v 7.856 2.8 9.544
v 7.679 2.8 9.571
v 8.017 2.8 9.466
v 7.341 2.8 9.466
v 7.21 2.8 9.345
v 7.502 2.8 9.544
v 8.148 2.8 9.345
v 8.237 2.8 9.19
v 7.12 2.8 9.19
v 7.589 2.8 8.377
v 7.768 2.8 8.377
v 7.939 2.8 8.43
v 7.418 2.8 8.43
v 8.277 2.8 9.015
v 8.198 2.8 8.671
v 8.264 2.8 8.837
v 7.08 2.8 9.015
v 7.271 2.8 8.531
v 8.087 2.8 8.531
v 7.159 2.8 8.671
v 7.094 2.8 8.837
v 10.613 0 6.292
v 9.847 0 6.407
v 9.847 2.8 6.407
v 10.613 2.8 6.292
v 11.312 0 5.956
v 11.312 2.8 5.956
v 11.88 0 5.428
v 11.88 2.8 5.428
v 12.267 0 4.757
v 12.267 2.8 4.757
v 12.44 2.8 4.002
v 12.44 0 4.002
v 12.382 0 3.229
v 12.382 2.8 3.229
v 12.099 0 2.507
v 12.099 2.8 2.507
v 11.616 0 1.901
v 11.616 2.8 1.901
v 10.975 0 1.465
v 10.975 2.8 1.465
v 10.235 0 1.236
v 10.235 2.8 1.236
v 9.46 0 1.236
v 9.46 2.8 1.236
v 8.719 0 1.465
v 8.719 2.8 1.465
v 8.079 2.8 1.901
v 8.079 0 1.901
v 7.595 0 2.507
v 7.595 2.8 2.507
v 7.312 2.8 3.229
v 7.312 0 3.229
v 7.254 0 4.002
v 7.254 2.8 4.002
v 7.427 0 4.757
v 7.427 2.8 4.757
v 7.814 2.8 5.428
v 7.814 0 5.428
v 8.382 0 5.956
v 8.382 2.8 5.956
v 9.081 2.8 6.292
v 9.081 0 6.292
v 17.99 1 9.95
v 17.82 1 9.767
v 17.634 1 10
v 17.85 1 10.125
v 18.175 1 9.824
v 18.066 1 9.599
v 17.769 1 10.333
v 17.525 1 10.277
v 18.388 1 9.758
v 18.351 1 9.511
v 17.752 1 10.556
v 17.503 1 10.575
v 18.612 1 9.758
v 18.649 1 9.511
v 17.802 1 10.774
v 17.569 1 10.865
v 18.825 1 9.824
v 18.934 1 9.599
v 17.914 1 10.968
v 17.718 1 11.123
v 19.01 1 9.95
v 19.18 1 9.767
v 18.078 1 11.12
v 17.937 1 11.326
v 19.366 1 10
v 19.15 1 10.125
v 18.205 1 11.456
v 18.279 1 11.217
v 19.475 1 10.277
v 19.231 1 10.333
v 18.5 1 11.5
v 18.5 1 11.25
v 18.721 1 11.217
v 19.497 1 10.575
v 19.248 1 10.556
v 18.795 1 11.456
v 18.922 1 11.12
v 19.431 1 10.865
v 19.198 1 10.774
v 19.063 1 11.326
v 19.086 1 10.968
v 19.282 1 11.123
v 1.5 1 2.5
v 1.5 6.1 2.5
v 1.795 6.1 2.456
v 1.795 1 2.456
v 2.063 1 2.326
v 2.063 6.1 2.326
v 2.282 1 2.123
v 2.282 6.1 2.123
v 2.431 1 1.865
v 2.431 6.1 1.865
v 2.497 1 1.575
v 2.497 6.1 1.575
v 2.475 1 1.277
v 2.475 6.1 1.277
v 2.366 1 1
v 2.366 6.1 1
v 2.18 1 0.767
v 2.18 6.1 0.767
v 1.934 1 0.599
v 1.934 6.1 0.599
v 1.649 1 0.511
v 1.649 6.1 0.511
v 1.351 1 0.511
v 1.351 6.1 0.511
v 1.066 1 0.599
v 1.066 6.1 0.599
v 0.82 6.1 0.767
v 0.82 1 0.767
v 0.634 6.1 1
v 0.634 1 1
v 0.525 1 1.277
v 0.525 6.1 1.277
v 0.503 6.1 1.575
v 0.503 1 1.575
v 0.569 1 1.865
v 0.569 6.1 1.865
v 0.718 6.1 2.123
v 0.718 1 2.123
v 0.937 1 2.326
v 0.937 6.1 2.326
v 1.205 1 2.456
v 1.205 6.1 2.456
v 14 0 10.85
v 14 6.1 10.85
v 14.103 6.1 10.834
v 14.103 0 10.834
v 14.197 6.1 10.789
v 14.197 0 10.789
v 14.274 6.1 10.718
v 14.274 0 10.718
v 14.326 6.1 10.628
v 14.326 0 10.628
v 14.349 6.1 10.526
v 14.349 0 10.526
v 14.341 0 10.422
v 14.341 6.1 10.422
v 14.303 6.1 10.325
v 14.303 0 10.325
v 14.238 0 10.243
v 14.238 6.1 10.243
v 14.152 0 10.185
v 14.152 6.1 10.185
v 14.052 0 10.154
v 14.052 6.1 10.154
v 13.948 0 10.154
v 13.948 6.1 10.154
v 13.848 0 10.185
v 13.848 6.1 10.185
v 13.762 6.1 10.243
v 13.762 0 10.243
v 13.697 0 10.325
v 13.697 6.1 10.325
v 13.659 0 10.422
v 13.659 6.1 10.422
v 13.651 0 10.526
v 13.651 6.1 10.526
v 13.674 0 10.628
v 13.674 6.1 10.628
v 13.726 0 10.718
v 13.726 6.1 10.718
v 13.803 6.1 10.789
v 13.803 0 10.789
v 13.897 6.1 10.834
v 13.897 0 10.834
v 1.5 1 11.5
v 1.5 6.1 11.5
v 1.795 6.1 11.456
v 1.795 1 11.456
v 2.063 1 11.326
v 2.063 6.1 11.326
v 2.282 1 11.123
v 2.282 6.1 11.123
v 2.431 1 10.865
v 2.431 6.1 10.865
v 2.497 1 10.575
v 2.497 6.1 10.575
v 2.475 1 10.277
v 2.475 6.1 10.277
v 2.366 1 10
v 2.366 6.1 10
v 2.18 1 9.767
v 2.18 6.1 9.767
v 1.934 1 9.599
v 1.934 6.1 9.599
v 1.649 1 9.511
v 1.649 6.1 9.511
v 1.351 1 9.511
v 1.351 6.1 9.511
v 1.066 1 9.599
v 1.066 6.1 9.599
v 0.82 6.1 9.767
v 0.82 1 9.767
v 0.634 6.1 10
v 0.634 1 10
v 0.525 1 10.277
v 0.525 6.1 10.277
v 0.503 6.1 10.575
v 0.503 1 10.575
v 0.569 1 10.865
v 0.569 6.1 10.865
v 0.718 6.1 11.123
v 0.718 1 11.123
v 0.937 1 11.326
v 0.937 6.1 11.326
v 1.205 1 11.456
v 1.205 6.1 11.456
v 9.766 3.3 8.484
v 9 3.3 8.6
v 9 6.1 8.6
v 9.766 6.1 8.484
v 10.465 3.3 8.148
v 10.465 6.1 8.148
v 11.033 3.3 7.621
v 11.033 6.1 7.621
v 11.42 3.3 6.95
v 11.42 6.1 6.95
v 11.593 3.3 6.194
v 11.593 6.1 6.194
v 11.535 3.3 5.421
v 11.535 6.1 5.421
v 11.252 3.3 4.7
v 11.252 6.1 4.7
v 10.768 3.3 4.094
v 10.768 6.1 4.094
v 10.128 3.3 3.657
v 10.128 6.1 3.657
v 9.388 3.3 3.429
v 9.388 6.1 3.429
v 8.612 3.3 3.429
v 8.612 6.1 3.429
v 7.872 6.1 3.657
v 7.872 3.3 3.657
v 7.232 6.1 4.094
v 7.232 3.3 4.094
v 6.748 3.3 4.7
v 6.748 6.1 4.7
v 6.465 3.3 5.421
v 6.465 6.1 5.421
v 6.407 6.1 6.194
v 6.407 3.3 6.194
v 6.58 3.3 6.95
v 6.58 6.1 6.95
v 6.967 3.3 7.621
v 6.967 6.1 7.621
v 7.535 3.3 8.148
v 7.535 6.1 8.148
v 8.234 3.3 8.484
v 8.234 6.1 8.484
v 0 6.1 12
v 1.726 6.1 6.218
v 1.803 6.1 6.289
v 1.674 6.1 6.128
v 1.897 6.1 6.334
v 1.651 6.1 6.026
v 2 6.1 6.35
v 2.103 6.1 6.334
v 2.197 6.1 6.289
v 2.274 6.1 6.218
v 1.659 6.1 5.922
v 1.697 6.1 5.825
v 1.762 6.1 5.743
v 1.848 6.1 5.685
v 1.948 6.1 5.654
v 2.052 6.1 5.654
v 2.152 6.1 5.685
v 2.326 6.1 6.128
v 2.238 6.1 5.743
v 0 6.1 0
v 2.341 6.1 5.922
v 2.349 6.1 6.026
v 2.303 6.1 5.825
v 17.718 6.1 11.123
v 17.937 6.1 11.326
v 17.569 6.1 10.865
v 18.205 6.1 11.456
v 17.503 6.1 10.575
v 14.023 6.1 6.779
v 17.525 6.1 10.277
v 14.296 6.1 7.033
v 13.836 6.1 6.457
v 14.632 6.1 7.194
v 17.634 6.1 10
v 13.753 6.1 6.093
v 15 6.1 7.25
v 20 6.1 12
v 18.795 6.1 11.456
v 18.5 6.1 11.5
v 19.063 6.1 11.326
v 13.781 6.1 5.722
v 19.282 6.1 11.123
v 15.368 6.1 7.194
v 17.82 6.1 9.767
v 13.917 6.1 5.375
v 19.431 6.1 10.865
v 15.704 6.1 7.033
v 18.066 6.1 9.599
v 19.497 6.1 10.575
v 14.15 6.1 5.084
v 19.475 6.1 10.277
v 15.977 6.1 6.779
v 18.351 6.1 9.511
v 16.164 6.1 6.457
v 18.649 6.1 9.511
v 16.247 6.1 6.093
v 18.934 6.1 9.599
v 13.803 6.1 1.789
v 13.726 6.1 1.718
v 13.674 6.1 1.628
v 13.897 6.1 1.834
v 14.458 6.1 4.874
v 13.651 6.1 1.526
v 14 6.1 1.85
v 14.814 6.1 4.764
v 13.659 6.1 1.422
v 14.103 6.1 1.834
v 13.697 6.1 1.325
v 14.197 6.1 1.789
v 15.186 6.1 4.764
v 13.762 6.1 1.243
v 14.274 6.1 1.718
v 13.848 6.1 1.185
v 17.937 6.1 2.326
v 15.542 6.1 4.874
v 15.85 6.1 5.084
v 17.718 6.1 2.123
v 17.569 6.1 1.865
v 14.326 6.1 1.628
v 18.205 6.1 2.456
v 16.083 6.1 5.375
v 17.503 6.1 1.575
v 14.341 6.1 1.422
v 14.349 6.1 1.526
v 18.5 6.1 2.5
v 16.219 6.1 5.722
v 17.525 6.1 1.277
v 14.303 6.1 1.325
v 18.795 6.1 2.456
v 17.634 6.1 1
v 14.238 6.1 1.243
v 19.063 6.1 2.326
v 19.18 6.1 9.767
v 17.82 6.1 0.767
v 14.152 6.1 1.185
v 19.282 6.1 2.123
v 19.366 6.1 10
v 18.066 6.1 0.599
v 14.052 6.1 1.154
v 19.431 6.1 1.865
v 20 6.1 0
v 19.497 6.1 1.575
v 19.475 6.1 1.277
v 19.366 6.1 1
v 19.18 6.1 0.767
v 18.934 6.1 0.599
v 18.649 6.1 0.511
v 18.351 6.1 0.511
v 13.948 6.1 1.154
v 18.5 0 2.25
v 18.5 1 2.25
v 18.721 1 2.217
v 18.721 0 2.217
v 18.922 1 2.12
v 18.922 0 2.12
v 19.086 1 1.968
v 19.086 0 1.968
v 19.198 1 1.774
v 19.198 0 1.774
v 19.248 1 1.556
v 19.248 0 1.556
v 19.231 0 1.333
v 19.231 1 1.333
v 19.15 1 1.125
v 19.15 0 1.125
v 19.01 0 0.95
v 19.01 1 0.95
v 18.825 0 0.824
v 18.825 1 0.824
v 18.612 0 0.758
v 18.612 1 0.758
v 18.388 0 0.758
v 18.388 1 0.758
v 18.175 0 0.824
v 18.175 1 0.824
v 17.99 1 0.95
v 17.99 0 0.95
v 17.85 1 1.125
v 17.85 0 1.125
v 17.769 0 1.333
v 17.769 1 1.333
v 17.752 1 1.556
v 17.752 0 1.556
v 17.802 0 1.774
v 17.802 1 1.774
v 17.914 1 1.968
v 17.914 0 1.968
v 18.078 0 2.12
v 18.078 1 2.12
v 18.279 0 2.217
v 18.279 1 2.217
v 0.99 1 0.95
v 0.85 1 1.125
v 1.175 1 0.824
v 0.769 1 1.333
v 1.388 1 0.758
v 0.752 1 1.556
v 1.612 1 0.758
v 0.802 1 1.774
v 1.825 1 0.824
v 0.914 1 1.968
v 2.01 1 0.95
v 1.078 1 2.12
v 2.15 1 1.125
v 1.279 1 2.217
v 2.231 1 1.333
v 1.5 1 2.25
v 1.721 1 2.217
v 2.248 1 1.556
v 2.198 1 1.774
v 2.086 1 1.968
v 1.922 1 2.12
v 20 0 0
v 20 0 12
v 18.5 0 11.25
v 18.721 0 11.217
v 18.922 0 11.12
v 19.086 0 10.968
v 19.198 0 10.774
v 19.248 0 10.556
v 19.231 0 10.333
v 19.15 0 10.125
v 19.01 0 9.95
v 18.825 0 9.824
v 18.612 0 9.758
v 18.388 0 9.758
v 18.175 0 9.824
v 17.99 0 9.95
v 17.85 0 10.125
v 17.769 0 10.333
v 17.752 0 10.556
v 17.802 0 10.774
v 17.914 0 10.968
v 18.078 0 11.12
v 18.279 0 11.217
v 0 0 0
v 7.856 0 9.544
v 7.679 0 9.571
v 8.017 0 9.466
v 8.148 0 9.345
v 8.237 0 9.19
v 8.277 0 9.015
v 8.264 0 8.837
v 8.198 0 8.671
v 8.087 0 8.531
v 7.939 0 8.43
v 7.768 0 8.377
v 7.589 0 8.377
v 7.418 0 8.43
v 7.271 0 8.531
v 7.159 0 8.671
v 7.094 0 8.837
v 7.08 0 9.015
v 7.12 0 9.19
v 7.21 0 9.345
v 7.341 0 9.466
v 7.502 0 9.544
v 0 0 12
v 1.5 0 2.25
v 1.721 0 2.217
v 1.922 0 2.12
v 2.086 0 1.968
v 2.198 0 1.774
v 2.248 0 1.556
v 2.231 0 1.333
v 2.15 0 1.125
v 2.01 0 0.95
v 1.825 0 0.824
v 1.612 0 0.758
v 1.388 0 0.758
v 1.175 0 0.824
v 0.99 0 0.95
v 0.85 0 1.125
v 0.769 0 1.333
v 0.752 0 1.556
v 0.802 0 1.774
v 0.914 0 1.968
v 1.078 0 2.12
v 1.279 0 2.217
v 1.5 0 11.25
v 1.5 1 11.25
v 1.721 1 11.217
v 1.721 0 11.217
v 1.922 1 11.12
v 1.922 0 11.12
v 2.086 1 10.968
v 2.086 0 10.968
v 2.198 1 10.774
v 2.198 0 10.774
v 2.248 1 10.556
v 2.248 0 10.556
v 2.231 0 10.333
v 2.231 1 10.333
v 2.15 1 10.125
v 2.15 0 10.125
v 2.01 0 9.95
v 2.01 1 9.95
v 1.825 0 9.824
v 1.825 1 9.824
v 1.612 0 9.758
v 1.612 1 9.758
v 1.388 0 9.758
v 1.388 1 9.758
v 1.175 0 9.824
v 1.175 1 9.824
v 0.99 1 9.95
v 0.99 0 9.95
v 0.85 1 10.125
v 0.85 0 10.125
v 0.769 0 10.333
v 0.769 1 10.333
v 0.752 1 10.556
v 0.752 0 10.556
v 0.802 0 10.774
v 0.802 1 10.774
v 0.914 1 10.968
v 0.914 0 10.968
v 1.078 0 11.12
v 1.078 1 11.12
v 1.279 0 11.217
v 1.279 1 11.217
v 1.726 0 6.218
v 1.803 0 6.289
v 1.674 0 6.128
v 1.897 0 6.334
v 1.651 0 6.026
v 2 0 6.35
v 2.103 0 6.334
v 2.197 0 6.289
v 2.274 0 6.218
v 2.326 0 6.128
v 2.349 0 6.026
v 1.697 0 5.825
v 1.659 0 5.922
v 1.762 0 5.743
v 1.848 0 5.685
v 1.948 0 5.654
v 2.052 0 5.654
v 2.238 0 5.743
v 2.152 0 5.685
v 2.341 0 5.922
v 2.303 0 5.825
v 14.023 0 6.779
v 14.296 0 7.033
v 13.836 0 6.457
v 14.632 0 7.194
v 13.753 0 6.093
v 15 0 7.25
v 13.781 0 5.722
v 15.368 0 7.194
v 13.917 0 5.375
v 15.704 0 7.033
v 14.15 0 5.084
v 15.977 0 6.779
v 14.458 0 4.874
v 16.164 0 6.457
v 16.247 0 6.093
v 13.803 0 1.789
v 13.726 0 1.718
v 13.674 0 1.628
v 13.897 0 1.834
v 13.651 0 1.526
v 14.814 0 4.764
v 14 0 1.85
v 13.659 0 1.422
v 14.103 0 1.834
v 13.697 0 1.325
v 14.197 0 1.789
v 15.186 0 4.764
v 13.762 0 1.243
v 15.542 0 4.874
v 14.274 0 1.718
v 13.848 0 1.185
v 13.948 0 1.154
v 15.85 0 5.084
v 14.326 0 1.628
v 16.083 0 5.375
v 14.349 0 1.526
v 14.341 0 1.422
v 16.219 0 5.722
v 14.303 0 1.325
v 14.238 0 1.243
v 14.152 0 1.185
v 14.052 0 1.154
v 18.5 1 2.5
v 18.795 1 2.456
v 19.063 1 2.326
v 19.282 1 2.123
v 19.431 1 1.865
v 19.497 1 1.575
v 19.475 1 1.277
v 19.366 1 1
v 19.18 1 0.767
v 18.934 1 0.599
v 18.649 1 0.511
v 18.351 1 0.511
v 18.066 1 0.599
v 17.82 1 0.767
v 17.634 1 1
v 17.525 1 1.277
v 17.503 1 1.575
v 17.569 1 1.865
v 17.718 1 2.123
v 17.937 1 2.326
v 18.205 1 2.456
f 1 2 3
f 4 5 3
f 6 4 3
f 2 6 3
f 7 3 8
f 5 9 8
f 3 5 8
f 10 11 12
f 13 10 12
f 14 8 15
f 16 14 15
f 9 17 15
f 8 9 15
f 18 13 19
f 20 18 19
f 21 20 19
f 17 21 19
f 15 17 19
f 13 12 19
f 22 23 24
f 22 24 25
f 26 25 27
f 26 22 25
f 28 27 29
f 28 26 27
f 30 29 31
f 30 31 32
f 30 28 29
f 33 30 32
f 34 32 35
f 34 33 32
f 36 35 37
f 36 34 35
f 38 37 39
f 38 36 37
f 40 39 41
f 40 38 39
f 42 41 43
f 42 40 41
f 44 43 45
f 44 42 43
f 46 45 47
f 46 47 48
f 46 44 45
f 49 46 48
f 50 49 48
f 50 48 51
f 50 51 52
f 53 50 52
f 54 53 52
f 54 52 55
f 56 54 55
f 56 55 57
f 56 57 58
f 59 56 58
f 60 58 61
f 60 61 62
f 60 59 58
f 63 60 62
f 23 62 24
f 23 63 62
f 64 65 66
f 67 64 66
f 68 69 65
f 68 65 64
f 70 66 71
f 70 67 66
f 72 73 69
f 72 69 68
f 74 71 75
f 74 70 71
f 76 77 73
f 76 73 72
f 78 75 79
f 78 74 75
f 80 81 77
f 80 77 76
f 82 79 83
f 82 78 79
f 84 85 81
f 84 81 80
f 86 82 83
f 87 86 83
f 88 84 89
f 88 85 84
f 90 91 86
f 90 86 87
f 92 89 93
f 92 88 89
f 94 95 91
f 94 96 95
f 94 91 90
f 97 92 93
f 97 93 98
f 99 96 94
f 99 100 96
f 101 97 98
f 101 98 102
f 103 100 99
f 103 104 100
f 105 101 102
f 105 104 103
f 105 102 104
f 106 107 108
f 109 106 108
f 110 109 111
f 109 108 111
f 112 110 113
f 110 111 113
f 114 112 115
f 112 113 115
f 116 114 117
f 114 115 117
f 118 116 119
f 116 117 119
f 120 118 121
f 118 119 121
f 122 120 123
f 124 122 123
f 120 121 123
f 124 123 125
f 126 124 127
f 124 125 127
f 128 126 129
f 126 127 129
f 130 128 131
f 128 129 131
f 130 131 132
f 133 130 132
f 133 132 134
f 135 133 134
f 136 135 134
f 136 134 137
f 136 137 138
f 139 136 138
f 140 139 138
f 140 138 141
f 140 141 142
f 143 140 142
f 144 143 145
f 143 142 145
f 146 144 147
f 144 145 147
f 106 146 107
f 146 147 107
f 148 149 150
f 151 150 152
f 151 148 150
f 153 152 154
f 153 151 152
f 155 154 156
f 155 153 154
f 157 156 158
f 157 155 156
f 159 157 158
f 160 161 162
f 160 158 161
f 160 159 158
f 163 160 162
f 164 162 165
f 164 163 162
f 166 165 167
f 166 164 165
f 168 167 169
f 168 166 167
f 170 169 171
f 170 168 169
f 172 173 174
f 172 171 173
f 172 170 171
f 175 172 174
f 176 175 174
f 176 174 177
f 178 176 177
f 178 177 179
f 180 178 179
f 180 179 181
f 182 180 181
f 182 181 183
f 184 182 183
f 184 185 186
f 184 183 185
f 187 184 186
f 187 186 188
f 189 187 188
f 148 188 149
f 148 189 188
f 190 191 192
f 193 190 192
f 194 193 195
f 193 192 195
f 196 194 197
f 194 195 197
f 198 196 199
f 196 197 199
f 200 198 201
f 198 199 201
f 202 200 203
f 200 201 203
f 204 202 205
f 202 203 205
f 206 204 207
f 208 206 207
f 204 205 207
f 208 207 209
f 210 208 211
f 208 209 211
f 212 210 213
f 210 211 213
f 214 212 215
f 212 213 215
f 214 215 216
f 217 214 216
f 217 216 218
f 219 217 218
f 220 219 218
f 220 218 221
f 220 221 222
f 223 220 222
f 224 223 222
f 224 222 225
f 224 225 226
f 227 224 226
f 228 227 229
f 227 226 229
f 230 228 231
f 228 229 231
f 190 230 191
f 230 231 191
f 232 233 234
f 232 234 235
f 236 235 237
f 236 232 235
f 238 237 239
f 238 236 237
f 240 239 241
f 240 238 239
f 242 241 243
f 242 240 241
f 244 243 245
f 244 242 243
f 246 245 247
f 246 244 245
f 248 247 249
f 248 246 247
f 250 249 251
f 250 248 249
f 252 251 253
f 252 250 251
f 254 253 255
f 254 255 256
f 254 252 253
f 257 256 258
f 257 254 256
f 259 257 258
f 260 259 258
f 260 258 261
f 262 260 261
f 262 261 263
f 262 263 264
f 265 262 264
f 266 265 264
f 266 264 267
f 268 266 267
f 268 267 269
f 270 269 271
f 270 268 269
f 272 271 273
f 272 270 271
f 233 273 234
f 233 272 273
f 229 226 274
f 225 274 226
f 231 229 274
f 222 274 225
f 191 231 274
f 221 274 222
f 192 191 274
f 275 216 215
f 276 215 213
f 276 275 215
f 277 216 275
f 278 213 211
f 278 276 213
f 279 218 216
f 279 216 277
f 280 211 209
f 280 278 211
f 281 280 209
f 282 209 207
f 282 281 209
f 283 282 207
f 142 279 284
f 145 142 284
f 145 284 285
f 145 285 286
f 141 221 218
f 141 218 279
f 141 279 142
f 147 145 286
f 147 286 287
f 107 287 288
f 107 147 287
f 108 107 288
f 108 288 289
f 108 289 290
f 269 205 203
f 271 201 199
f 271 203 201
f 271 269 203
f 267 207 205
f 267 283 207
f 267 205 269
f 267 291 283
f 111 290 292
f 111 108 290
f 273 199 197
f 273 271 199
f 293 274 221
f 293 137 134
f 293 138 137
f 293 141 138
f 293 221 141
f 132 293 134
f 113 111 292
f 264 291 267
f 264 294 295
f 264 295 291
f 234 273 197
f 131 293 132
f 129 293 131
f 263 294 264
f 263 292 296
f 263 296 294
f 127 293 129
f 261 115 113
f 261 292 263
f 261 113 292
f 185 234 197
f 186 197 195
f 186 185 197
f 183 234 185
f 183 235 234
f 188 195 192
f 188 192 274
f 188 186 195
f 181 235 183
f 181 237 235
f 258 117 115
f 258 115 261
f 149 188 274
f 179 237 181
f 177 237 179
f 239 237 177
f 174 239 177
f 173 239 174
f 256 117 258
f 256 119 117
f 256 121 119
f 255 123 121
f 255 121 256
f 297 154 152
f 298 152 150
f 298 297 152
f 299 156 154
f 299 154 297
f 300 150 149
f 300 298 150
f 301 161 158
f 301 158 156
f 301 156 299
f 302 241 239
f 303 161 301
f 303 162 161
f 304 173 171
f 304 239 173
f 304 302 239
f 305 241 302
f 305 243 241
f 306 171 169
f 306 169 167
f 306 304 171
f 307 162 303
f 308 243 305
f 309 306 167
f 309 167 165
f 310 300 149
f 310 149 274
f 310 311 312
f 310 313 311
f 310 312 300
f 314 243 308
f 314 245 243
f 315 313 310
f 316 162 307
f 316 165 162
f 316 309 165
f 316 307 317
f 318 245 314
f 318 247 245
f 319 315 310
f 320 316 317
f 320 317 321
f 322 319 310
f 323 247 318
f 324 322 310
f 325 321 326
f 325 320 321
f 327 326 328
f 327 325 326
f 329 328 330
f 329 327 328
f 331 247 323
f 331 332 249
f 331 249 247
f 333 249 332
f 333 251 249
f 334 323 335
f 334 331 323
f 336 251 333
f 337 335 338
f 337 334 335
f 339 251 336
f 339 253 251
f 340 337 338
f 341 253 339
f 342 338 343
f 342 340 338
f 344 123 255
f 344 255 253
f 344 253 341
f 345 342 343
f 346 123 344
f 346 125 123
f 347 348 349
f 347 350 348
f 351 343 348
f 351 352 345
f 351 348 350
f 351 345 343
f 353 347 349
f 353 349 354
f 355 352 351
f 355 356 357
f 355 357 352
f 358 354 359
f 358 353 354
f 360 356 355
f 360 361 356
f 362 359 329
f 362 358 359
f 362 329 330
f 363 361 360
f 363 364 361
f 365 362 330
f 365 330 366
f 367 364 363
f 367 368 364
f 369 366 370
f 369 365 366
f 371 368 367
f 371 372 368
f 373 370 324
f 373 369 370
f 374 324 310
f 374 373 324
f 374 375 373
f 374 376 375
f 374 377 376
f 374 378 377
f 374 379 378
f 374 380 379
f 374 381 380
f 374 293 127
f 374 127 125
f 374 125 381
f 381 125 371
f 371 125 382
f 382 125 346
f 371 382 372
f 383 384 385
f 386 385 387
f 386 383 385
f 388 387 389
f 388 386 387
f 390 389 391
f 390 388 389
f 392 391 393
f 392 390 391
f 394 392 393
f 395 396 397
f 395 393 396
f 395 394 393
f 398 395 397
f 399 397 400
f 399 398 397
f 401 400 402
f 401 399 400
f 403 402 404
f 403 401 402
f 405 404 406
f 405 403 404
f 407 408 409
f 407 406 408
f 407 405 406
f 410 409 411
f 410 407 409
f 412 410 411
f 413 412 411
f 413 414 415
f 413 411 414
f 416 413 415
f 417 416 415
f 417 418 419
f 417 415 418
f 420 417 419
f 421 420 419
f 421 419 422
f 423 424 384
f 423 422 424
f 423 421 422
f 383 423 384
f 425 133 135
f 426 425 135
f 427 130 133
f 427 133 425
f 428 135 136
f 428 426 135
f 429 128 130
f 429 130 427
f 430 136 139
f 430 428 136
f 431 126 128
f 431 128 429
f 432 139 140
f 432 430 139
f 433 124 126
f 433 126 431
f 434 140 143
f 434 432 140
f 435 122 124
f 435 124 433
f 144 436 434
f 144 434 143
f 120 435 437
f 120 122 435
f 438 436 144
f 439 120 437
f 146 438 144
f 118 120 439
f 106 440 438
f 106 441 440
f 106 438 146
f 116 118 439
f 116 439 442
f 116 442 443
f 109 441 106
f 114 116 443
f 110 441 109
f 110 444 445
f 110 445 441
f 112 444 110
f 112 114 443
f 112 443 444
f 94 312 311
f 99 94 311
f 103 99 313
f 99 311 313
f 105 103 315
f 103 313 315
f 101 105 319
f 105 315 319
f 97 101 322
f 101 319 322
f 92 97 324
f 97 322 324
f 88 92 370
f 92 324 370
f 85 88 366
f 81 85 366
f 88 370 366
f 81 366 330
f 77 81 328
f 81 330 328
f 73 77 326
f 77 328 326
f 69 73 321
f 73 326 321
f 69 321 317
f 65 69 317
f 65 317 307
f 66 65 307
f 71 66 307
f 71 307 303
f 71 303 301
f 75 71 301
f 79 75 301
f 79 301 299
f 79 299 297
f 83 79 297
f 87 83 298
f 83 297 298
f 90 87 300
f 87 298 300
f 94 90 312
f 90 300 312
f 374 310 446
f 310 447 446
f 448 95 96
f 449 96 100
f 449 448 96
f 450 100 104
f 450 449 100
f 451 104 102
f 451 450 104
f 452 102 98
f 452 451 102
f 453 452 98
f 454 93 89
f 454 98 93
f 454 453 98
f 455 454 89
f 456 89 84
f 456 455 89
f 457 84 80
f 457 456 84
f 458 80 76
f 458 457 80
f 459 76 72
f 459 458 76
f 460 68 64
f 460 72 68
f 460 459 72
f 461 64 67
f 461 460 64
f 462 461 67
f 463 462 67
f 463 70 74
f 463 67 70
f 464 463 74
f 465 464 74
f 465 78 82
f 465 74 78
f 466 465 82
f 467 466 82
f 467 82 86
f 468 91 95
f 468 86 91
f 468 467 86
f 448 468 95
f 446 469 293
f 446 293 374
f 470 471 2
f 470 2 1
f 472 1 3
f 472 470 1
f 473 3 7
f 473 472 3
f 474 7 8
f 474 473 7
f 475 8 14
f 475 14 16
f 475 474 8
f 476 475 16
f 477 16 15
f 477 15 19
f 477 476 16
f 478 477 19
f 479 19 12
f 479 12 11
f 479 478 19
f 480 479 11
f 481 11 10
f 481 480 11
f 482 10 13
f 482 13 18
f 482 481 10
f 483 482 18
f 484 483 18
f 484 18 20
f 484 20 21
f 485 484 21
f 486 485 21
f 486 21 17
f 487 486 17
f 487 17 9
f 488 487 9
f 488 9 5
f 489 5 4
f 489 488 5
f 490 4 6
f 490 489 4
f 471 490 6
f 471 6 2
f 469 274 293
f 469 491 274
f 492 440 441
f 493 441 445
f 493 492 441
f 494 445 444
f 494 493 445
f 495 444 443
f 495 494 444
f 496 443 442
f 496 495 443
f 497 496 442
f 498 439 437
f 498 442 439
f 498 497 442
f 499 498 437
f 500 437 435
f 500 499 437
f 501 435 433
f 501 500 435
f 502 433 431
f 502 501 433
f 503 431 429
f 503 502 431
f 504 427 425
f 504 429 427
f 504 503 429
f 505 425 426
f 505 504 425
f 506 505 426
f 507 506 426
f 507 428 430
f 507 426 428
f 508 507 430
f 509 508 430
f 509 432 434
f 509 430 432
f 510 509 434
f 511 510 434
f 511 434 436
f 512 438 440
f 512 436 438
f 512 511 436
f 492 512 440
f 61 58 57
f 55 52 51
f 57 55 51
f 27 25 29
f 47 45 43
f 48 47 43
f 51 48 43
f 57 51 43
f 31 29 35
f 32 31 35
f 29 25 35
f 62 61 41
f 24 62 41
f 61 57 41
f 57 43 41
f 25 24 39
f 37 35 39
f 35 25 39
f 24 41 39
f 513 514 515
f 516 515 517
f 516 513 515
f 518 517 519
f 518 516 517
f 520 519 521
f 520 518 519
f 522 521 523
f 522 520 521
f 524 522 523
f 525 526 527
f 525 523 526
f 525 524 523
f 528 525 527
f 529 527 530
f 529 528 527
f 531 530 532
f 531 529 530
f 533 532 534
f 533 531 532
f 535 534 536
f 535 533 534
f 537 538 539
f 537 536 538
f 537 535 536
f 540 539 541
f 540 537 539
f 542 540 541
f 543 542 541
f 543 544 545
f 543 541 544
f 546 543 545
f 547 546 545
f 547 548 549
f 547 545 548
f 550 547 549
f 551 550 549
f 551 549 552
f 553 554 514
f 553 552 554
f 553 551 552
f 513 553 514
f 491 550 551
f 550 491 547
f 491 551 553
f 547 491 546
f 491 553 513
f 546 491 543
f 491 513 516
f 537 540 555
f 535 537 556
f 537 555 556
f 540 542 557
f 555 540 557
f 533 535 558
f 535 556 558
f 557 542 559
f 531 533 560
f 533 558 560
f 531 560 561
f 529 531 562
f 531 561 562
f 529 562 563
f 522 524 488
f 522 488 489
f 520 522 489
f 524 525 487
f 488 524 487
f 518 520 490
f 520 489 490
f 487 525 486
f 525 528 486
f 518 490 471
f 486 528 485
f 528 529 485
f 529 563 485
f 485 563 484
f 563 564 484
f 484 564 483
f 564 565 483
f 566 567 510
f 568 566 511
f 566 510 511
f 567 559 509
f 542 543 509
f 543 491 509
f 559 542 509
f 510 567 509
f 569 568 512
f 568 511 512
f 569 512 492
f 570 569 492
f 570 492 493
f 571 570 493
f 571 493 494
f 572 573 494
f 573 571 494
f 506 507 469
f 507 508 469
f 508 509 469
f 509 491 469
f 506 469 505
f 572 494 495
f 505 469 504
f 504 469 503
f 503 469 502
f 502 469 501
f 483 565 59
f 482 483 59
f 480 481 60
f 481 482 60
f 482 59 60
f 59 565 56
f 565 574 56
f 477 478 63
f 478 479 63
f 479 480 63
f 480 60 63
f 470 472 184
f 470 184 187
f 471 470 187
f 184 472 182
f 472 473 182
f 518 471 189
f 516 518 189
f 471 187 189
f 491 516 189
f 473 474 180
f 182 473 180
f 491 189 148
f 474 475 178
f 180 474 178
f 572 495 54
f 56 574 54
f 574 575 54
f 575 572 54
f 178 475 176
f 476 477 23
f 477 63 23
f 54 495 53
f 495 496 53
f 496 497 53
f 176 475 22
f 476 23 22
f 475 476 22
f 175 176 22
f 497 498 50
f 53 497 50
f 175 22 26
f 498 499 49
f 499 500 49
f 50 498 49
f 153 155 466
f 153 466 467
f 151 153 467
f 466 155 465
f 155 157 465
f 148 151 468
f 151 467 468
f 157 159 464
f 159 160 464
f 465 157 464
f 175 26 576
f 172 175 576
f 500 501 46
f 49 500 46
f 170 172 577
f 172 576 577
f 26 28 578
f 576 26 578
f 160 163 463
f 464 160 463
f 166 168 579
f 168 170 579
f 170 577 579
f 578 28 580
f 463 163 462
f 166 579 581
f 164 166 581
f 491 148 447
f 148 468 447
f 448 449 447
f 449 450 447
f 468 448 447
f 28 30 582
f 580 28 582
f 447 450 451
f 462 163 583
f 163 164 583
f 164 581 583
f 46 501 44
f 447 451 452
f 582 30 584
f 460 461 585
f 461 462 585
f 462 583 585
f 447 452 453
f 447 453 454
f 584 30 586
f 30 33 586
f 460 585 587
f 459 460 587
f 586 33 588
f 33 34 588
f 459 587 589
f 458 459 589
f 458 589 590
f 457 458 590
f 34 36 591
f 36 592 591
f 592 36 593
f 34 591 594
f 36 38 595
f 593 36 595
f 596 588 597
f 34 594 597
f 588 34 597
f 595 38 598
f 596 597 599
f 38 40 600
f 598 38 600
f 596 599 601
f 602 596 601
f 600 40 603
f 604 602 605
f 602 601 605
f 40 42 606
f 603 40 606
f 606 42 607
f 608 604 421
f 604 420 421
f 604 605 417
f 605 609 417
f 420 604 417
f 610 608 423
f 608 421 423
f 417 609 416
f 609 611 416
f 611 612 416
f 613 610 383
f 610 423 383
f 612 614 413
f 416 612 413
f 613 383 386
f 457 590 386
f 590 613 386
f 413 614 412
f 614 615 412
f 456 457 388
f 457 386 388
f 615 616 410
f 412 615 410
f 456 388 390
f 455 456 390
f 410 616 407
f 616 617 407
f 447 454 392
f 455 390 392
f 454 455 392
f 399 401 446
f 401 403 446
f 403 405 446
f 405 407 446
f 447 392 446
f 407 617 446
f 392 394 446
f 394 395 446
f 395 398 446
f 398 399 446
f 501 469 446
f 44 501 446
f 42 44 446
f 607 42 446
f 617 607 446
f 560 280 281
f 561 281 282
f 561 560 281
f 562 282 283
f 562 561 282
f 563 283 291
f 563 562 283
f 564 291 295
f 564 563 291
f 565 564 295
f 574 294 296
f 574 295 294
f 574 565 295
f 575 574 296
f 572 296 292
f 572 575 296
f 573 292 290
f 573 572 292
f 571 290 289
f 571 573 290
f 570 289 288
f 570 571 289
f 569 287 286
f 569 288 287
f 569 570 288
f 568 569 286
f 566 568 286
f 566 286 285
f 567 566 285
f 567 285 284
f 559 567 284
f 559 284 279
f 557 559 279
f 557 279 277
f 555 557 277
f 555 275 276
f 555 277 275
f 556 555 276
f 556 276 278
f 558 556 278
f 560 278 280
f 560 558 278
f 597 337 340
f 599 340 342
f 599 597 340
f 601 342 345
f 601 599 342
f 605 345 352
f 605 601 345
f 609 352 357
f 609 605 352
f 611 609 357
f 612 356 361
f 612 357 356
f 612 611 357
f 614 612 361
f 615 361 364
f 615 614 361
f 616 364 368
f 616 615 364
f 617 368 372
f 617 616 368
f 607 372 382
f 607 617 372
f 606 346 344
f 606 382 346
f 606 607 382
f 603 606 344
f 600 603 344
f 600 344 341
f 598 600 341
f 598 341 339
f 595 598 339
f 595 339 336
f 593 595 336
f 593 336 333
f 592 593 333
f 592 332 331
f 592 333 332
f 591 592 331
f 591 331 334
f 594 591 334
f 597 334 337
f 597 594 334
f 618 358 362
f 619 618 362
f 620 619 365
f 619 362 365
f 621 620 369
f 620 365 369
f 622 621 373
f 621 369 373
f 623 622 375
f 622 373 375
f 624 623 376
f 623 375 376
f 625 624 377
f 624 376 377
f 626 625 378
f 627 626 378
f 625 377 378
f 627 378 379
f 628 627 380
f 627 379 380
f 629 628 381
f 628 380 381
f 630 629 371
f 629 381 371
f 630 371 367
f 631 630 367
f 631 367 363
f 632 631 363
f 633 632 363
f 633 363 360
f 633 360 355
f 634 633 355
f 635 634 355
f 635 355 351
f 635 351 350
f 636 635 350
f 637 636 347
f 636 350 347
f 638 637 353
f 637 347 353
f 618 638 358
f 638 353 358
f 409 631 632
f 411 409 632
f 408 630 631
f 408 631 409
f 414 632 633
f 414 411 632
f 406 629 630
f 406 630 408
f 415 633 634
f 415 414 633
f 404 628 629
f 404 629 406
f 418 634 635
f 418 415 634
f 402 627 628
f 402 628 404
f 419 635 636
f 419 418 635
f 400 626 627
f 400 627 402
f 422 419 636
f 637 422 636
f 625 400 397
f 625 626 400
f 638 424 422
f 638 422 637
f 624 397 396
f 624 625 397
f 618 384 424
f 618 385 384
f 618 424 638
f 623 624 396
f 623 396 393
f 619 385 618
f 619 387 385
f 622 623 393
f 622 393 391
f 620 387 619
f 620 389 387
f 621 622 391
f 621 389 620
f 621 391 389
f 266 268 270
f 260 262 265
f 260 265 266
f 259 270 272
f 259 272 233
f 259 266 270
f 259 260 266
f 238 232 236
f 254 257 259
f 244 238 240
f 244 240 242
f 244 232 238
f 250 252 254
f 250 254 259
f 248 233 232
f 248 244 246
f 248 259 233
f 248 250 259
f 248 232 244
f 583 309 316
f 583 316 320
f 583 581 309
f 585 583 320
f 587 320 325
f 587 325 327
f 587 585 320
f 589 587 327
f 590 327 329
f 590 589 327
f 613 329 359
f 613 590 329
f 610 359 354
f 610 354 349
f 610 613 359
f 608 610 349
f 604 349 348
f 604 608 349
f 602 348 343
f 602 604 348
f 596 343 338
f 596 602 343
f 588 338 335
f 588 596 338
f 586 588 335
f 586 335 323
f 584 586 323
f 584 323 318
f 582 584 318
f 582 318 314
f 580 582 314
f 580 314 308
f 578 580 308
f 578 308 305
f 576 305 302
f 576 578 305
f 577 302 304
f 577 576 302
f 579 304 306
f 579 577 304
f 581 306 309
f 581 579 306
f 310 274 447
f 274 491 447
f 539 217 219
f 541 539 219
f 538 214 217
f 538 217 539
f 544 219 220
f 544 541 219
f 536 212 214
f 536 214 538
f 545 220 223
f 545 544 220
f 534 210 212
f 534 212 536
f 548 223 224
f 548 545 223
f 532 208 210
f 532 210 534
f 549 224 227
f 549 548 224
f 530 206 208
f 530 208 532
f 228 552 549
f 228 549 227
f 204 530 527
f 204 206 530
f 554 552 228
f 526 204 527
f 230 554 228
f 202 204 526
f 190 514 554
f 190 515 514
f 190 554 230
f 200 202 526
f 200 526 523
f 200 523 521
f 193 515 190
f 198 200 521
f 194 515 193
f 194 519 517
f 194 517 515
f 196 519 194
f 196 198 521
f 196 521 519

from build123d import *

# Parameters (mm, degrees)
SKETCH_1_W          = 20
SKETCH_1_H          = 12
SKETCH_1_R          = 1.25
SKETCH_1_R_2        = 0.6
SKETCH_1_R_3        = 2.6
EXTRUDE_1_DEPTH     = 2.8
EXTRUDE_START       = 2.8
SKETCH_1_9_W        = 20
SKETCH_1_9_H        = 12
SKETCH_1_9_R        = 1.25
EXTRUDE_2_DEPTH     = 0.5
EXTRUDE_START_2     = 3.3
SKETCH_1_10_W       = 20
SKETCH_1_10_H       = 12
SKETCH_1_10_R       = 1.25
SKETCH_1_10_R_2     = 2.6
EXTRUDE_3_DEPTH     = 2.8
SKETCH_3_R          = 0.75
SKETCH_3_R_2        = 0.35
CUT_EXTRUDE_3_DEPTH = 25.108297327
CUT_EXTRUDE_START   = 6.1
SKETCH_3_4_R        = 1
CUT_EXTRUDE_5_DEPTH = 5.1


with BuildPart() as part:
    # 草图1 → 凸台-拉伸1 (new body)
    with BuildSketch(Plane(origin=(0, 0, 0), x_dir=(1, 0, 0), z_dir=(0, 1, 0))):
        with Locations((10, -6)):
            Rectangle(SKETCH_1_W, SKETCH_1_H)
        with Locations(Location((15, -6, 0), (0, 0, 270))):
            Circle(SKETCH_1_R, mode=Mode.SUBTRACT)
        with Locations(Location((7.678736094, -8.970584613, 0), (0, 0, 270))):
            Circle(SKETCH_1_R_2, mode=Mode.SUBTRACT)
        with Locations(Location((9.847079862, -3.807418404, 0), (0, 0, 270))):
            Circle(SKETCH_1_R_3, mode=Mode.SUBTRACT)
    extrude(amount=EXTRUDE_1_DEPTH)

    # 草图1<9> → 凸台-拉伸2 (add)
    with BuildSketch(Plane(origin=(0, 0, 0), x_dir=(1, 0, 0), z_dir=(0, 1, 0)).offset(EXTRUDE_START)):
        with Locations((10, -6)):
            Rectangle(SKETCH_1_9_W, SKETCH_1_9_H)
        with Locations(Location((15, -6, 0), (0, 0, 270))):
            Circle(SKETCH_1_9_R, mode=Mode.SUBTRACT)
    extrude(amount=EXTRUDE_2_DEPTH)

    # 草图1<10> → 凸台-拉伸3 (add)
    with BuildSketch(Plane(origin=(0, 0, 0), x_dir=(1, 0, 0), z_dir=(0, 1, 0)).offset(EXTRUDE_START_2)):
        with Locations((10, -6)):
            Rectangle(SKETCH_1_10_W, SKETCH_1_10_H)
        with Locations(Location((15, -6, 0), (0, 0, 270))):
            Circle(SKETCH_1_10_R, mode=Mode.SUBTRACT)
        with Locations(Location((9, -6, 0), (0, 0, 270))):
            Circle(SKETCH_1_10_R_2, mode=Mode.SUBTRACT)
    extrude(amount=EXTRUDE_3_DEPTH)

    # 草图3 → 切除-拉伸3 (cut, through all)
    with BuildSketch(Plane(origin=(0, 0, 0), x_dir=(1, 0, 0), z_dir=(0, 1, 0))):
        with Locations(Location((1.5, -1.5, 0), (0, 0, 270))):
            Circle(SKETCH_3_R)
        with Locations(Location((1.5, -10.5, 0), (0, 0, 270))):
            Circle(SKETCH_3_R)
        with Locations(Location((18.5, -10.5, 0), (0, 0, 270))):
            Circle(SKETCH_3_R)
        with Locations(Location((18.5, -1.5, 0), (0, 0, 270))):
            Circle(SKETCH_3_R)
        with Locations(Location((2, -6, 0), (0, 0, 270))):
            Circle(SKETCH_3_R_2)
        with Locations(Location((14, -1.5, 0), (0, 0, 270))):
            Circle(SKETCH_3_R_2)
        with Locations(Location((14, -10.5, 0), (0, 0, 270))):
            Circle(SKETCH_3_R_2)
    extrude(amount=CUT_EXTRUDE_3_DEPTH, mode=Mode.SUBTRACT)

    # 草图3<4> → 切除-拉伸5 (cut)
    with BuildSketch(Plane(origin=(0, 0, 0), x_dir=(1, 0, 0), z_dir=(0, 1, 0)).offset(CUT_EXTRUDE_START)):
        with Locations(Location((1.5, -1.5, 0), (0, 0, 270))):
            Circle(SKETCH_3_4_R)
        with Locations(Location((1.5, -10.5, 0), (0, 0, 270))):
            Circle(SKETCH_3_4_R)
        with Locations(Location((18.5, -1.5, 0), (0, 0, 270))):
            Circle(SKETCH_3_4_R)
        with Locations(Location((18.5, -10.5, 0), (0, 0, 270))):
            Circle(SKETCH_3_4_R)
    extrude(amount=-CUT_EXTRUDE_5_DEPTH, mode=Mode.SUBTRACT)


solid = part.part
